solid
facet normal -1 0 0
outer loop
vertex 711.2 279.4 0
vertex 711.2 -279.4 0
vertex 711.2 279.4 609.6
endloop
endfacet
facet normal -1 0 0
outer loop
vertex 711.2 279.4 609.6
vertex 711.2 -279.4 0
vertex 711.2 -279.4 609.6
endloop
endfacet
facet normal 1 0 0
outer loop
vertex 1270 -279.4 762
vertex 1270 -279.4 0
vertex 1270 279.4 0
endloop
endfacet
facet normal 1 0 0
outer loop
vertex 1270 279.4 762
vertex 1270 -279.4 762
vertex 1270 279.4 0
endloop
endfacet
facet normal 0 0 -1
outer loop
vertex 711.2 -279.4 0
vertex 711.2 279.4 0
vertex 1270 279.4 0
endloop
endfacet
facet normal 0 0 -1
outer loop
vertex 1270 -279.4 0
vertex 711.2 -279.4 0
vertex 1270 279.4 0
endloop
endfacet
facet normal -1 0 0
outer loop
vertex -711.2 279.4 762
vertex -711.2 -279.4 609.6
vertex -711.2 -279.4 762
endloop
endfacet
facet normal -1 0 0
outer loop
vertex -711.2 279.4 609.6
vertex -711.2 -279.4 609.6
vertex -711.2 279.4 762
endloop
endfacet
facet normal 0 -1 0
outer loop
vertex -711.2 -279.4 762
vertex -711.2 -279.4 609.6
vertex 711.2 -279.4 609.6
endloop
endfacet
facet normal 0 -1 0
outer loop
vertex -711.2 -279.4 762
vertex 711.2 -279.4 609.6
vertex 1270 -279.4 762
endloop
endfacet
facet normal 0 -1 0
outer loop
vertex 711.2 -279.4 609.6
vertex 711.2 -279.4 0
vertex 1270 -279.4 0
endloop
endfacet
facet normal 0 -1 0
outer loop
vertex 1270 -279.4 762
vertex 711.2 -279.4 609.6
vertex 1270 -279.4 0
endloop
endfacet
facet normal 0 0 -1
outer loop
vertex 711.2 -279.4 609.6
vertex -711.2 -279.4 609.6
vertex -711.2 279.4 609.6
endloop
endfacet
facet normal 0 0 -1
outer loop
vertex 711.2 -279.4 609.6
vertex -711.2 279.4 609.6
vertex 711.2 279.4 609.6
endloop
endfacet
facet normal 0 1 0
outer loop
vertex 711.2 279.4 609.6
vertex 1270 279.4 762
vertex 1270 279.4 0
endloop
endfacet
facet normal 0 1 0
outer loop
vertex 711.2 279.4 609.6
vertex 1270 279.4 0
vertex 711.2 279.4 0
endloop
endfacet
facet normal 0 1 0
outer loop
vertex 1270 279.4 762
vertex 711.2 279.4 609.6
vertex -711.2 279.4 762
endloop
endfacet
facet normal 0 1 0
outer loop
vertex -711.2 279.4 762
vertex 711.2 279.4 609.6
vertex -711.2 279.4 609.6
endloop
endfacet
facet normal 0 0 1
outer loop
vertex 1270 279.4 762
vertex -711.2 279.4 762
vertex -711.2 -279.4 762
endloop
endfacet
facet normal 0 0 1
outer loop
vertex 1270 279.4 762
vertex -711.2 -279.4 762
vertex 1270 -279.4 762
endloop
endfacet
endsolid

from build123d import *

# Parameters (mm, degrees)
F0_W     = 1422.4
F0_H     = 558.8
F0_W_2   = 558.8
F1_DEPTH = 762
F2_W     = 1422.4
F2_H     = 609.6
F3_DEPTH = 558.8


with BuildPart() as f1:
    # F0 (on Top) → F1 (new body)
    with BuildSketch(Plane.XY):
        Rectangle(F0_W, F0_H)
        with Locations((990.6, 0)):
            Rectangle(F0_W_2, F0_H)
    extrude(amount=F1_DEPTH)

    # F2 (on face) → F3 (cut)
    with BuildSketch(Plane.XZ.offset(279.4)):
        with Locations((0, 304.8)):
            Rectangle(F2_W, F2_H)
    extrude(amount=-F3_DEPTH, mode=Mode.SUBTRACT)


solid = f1.part
